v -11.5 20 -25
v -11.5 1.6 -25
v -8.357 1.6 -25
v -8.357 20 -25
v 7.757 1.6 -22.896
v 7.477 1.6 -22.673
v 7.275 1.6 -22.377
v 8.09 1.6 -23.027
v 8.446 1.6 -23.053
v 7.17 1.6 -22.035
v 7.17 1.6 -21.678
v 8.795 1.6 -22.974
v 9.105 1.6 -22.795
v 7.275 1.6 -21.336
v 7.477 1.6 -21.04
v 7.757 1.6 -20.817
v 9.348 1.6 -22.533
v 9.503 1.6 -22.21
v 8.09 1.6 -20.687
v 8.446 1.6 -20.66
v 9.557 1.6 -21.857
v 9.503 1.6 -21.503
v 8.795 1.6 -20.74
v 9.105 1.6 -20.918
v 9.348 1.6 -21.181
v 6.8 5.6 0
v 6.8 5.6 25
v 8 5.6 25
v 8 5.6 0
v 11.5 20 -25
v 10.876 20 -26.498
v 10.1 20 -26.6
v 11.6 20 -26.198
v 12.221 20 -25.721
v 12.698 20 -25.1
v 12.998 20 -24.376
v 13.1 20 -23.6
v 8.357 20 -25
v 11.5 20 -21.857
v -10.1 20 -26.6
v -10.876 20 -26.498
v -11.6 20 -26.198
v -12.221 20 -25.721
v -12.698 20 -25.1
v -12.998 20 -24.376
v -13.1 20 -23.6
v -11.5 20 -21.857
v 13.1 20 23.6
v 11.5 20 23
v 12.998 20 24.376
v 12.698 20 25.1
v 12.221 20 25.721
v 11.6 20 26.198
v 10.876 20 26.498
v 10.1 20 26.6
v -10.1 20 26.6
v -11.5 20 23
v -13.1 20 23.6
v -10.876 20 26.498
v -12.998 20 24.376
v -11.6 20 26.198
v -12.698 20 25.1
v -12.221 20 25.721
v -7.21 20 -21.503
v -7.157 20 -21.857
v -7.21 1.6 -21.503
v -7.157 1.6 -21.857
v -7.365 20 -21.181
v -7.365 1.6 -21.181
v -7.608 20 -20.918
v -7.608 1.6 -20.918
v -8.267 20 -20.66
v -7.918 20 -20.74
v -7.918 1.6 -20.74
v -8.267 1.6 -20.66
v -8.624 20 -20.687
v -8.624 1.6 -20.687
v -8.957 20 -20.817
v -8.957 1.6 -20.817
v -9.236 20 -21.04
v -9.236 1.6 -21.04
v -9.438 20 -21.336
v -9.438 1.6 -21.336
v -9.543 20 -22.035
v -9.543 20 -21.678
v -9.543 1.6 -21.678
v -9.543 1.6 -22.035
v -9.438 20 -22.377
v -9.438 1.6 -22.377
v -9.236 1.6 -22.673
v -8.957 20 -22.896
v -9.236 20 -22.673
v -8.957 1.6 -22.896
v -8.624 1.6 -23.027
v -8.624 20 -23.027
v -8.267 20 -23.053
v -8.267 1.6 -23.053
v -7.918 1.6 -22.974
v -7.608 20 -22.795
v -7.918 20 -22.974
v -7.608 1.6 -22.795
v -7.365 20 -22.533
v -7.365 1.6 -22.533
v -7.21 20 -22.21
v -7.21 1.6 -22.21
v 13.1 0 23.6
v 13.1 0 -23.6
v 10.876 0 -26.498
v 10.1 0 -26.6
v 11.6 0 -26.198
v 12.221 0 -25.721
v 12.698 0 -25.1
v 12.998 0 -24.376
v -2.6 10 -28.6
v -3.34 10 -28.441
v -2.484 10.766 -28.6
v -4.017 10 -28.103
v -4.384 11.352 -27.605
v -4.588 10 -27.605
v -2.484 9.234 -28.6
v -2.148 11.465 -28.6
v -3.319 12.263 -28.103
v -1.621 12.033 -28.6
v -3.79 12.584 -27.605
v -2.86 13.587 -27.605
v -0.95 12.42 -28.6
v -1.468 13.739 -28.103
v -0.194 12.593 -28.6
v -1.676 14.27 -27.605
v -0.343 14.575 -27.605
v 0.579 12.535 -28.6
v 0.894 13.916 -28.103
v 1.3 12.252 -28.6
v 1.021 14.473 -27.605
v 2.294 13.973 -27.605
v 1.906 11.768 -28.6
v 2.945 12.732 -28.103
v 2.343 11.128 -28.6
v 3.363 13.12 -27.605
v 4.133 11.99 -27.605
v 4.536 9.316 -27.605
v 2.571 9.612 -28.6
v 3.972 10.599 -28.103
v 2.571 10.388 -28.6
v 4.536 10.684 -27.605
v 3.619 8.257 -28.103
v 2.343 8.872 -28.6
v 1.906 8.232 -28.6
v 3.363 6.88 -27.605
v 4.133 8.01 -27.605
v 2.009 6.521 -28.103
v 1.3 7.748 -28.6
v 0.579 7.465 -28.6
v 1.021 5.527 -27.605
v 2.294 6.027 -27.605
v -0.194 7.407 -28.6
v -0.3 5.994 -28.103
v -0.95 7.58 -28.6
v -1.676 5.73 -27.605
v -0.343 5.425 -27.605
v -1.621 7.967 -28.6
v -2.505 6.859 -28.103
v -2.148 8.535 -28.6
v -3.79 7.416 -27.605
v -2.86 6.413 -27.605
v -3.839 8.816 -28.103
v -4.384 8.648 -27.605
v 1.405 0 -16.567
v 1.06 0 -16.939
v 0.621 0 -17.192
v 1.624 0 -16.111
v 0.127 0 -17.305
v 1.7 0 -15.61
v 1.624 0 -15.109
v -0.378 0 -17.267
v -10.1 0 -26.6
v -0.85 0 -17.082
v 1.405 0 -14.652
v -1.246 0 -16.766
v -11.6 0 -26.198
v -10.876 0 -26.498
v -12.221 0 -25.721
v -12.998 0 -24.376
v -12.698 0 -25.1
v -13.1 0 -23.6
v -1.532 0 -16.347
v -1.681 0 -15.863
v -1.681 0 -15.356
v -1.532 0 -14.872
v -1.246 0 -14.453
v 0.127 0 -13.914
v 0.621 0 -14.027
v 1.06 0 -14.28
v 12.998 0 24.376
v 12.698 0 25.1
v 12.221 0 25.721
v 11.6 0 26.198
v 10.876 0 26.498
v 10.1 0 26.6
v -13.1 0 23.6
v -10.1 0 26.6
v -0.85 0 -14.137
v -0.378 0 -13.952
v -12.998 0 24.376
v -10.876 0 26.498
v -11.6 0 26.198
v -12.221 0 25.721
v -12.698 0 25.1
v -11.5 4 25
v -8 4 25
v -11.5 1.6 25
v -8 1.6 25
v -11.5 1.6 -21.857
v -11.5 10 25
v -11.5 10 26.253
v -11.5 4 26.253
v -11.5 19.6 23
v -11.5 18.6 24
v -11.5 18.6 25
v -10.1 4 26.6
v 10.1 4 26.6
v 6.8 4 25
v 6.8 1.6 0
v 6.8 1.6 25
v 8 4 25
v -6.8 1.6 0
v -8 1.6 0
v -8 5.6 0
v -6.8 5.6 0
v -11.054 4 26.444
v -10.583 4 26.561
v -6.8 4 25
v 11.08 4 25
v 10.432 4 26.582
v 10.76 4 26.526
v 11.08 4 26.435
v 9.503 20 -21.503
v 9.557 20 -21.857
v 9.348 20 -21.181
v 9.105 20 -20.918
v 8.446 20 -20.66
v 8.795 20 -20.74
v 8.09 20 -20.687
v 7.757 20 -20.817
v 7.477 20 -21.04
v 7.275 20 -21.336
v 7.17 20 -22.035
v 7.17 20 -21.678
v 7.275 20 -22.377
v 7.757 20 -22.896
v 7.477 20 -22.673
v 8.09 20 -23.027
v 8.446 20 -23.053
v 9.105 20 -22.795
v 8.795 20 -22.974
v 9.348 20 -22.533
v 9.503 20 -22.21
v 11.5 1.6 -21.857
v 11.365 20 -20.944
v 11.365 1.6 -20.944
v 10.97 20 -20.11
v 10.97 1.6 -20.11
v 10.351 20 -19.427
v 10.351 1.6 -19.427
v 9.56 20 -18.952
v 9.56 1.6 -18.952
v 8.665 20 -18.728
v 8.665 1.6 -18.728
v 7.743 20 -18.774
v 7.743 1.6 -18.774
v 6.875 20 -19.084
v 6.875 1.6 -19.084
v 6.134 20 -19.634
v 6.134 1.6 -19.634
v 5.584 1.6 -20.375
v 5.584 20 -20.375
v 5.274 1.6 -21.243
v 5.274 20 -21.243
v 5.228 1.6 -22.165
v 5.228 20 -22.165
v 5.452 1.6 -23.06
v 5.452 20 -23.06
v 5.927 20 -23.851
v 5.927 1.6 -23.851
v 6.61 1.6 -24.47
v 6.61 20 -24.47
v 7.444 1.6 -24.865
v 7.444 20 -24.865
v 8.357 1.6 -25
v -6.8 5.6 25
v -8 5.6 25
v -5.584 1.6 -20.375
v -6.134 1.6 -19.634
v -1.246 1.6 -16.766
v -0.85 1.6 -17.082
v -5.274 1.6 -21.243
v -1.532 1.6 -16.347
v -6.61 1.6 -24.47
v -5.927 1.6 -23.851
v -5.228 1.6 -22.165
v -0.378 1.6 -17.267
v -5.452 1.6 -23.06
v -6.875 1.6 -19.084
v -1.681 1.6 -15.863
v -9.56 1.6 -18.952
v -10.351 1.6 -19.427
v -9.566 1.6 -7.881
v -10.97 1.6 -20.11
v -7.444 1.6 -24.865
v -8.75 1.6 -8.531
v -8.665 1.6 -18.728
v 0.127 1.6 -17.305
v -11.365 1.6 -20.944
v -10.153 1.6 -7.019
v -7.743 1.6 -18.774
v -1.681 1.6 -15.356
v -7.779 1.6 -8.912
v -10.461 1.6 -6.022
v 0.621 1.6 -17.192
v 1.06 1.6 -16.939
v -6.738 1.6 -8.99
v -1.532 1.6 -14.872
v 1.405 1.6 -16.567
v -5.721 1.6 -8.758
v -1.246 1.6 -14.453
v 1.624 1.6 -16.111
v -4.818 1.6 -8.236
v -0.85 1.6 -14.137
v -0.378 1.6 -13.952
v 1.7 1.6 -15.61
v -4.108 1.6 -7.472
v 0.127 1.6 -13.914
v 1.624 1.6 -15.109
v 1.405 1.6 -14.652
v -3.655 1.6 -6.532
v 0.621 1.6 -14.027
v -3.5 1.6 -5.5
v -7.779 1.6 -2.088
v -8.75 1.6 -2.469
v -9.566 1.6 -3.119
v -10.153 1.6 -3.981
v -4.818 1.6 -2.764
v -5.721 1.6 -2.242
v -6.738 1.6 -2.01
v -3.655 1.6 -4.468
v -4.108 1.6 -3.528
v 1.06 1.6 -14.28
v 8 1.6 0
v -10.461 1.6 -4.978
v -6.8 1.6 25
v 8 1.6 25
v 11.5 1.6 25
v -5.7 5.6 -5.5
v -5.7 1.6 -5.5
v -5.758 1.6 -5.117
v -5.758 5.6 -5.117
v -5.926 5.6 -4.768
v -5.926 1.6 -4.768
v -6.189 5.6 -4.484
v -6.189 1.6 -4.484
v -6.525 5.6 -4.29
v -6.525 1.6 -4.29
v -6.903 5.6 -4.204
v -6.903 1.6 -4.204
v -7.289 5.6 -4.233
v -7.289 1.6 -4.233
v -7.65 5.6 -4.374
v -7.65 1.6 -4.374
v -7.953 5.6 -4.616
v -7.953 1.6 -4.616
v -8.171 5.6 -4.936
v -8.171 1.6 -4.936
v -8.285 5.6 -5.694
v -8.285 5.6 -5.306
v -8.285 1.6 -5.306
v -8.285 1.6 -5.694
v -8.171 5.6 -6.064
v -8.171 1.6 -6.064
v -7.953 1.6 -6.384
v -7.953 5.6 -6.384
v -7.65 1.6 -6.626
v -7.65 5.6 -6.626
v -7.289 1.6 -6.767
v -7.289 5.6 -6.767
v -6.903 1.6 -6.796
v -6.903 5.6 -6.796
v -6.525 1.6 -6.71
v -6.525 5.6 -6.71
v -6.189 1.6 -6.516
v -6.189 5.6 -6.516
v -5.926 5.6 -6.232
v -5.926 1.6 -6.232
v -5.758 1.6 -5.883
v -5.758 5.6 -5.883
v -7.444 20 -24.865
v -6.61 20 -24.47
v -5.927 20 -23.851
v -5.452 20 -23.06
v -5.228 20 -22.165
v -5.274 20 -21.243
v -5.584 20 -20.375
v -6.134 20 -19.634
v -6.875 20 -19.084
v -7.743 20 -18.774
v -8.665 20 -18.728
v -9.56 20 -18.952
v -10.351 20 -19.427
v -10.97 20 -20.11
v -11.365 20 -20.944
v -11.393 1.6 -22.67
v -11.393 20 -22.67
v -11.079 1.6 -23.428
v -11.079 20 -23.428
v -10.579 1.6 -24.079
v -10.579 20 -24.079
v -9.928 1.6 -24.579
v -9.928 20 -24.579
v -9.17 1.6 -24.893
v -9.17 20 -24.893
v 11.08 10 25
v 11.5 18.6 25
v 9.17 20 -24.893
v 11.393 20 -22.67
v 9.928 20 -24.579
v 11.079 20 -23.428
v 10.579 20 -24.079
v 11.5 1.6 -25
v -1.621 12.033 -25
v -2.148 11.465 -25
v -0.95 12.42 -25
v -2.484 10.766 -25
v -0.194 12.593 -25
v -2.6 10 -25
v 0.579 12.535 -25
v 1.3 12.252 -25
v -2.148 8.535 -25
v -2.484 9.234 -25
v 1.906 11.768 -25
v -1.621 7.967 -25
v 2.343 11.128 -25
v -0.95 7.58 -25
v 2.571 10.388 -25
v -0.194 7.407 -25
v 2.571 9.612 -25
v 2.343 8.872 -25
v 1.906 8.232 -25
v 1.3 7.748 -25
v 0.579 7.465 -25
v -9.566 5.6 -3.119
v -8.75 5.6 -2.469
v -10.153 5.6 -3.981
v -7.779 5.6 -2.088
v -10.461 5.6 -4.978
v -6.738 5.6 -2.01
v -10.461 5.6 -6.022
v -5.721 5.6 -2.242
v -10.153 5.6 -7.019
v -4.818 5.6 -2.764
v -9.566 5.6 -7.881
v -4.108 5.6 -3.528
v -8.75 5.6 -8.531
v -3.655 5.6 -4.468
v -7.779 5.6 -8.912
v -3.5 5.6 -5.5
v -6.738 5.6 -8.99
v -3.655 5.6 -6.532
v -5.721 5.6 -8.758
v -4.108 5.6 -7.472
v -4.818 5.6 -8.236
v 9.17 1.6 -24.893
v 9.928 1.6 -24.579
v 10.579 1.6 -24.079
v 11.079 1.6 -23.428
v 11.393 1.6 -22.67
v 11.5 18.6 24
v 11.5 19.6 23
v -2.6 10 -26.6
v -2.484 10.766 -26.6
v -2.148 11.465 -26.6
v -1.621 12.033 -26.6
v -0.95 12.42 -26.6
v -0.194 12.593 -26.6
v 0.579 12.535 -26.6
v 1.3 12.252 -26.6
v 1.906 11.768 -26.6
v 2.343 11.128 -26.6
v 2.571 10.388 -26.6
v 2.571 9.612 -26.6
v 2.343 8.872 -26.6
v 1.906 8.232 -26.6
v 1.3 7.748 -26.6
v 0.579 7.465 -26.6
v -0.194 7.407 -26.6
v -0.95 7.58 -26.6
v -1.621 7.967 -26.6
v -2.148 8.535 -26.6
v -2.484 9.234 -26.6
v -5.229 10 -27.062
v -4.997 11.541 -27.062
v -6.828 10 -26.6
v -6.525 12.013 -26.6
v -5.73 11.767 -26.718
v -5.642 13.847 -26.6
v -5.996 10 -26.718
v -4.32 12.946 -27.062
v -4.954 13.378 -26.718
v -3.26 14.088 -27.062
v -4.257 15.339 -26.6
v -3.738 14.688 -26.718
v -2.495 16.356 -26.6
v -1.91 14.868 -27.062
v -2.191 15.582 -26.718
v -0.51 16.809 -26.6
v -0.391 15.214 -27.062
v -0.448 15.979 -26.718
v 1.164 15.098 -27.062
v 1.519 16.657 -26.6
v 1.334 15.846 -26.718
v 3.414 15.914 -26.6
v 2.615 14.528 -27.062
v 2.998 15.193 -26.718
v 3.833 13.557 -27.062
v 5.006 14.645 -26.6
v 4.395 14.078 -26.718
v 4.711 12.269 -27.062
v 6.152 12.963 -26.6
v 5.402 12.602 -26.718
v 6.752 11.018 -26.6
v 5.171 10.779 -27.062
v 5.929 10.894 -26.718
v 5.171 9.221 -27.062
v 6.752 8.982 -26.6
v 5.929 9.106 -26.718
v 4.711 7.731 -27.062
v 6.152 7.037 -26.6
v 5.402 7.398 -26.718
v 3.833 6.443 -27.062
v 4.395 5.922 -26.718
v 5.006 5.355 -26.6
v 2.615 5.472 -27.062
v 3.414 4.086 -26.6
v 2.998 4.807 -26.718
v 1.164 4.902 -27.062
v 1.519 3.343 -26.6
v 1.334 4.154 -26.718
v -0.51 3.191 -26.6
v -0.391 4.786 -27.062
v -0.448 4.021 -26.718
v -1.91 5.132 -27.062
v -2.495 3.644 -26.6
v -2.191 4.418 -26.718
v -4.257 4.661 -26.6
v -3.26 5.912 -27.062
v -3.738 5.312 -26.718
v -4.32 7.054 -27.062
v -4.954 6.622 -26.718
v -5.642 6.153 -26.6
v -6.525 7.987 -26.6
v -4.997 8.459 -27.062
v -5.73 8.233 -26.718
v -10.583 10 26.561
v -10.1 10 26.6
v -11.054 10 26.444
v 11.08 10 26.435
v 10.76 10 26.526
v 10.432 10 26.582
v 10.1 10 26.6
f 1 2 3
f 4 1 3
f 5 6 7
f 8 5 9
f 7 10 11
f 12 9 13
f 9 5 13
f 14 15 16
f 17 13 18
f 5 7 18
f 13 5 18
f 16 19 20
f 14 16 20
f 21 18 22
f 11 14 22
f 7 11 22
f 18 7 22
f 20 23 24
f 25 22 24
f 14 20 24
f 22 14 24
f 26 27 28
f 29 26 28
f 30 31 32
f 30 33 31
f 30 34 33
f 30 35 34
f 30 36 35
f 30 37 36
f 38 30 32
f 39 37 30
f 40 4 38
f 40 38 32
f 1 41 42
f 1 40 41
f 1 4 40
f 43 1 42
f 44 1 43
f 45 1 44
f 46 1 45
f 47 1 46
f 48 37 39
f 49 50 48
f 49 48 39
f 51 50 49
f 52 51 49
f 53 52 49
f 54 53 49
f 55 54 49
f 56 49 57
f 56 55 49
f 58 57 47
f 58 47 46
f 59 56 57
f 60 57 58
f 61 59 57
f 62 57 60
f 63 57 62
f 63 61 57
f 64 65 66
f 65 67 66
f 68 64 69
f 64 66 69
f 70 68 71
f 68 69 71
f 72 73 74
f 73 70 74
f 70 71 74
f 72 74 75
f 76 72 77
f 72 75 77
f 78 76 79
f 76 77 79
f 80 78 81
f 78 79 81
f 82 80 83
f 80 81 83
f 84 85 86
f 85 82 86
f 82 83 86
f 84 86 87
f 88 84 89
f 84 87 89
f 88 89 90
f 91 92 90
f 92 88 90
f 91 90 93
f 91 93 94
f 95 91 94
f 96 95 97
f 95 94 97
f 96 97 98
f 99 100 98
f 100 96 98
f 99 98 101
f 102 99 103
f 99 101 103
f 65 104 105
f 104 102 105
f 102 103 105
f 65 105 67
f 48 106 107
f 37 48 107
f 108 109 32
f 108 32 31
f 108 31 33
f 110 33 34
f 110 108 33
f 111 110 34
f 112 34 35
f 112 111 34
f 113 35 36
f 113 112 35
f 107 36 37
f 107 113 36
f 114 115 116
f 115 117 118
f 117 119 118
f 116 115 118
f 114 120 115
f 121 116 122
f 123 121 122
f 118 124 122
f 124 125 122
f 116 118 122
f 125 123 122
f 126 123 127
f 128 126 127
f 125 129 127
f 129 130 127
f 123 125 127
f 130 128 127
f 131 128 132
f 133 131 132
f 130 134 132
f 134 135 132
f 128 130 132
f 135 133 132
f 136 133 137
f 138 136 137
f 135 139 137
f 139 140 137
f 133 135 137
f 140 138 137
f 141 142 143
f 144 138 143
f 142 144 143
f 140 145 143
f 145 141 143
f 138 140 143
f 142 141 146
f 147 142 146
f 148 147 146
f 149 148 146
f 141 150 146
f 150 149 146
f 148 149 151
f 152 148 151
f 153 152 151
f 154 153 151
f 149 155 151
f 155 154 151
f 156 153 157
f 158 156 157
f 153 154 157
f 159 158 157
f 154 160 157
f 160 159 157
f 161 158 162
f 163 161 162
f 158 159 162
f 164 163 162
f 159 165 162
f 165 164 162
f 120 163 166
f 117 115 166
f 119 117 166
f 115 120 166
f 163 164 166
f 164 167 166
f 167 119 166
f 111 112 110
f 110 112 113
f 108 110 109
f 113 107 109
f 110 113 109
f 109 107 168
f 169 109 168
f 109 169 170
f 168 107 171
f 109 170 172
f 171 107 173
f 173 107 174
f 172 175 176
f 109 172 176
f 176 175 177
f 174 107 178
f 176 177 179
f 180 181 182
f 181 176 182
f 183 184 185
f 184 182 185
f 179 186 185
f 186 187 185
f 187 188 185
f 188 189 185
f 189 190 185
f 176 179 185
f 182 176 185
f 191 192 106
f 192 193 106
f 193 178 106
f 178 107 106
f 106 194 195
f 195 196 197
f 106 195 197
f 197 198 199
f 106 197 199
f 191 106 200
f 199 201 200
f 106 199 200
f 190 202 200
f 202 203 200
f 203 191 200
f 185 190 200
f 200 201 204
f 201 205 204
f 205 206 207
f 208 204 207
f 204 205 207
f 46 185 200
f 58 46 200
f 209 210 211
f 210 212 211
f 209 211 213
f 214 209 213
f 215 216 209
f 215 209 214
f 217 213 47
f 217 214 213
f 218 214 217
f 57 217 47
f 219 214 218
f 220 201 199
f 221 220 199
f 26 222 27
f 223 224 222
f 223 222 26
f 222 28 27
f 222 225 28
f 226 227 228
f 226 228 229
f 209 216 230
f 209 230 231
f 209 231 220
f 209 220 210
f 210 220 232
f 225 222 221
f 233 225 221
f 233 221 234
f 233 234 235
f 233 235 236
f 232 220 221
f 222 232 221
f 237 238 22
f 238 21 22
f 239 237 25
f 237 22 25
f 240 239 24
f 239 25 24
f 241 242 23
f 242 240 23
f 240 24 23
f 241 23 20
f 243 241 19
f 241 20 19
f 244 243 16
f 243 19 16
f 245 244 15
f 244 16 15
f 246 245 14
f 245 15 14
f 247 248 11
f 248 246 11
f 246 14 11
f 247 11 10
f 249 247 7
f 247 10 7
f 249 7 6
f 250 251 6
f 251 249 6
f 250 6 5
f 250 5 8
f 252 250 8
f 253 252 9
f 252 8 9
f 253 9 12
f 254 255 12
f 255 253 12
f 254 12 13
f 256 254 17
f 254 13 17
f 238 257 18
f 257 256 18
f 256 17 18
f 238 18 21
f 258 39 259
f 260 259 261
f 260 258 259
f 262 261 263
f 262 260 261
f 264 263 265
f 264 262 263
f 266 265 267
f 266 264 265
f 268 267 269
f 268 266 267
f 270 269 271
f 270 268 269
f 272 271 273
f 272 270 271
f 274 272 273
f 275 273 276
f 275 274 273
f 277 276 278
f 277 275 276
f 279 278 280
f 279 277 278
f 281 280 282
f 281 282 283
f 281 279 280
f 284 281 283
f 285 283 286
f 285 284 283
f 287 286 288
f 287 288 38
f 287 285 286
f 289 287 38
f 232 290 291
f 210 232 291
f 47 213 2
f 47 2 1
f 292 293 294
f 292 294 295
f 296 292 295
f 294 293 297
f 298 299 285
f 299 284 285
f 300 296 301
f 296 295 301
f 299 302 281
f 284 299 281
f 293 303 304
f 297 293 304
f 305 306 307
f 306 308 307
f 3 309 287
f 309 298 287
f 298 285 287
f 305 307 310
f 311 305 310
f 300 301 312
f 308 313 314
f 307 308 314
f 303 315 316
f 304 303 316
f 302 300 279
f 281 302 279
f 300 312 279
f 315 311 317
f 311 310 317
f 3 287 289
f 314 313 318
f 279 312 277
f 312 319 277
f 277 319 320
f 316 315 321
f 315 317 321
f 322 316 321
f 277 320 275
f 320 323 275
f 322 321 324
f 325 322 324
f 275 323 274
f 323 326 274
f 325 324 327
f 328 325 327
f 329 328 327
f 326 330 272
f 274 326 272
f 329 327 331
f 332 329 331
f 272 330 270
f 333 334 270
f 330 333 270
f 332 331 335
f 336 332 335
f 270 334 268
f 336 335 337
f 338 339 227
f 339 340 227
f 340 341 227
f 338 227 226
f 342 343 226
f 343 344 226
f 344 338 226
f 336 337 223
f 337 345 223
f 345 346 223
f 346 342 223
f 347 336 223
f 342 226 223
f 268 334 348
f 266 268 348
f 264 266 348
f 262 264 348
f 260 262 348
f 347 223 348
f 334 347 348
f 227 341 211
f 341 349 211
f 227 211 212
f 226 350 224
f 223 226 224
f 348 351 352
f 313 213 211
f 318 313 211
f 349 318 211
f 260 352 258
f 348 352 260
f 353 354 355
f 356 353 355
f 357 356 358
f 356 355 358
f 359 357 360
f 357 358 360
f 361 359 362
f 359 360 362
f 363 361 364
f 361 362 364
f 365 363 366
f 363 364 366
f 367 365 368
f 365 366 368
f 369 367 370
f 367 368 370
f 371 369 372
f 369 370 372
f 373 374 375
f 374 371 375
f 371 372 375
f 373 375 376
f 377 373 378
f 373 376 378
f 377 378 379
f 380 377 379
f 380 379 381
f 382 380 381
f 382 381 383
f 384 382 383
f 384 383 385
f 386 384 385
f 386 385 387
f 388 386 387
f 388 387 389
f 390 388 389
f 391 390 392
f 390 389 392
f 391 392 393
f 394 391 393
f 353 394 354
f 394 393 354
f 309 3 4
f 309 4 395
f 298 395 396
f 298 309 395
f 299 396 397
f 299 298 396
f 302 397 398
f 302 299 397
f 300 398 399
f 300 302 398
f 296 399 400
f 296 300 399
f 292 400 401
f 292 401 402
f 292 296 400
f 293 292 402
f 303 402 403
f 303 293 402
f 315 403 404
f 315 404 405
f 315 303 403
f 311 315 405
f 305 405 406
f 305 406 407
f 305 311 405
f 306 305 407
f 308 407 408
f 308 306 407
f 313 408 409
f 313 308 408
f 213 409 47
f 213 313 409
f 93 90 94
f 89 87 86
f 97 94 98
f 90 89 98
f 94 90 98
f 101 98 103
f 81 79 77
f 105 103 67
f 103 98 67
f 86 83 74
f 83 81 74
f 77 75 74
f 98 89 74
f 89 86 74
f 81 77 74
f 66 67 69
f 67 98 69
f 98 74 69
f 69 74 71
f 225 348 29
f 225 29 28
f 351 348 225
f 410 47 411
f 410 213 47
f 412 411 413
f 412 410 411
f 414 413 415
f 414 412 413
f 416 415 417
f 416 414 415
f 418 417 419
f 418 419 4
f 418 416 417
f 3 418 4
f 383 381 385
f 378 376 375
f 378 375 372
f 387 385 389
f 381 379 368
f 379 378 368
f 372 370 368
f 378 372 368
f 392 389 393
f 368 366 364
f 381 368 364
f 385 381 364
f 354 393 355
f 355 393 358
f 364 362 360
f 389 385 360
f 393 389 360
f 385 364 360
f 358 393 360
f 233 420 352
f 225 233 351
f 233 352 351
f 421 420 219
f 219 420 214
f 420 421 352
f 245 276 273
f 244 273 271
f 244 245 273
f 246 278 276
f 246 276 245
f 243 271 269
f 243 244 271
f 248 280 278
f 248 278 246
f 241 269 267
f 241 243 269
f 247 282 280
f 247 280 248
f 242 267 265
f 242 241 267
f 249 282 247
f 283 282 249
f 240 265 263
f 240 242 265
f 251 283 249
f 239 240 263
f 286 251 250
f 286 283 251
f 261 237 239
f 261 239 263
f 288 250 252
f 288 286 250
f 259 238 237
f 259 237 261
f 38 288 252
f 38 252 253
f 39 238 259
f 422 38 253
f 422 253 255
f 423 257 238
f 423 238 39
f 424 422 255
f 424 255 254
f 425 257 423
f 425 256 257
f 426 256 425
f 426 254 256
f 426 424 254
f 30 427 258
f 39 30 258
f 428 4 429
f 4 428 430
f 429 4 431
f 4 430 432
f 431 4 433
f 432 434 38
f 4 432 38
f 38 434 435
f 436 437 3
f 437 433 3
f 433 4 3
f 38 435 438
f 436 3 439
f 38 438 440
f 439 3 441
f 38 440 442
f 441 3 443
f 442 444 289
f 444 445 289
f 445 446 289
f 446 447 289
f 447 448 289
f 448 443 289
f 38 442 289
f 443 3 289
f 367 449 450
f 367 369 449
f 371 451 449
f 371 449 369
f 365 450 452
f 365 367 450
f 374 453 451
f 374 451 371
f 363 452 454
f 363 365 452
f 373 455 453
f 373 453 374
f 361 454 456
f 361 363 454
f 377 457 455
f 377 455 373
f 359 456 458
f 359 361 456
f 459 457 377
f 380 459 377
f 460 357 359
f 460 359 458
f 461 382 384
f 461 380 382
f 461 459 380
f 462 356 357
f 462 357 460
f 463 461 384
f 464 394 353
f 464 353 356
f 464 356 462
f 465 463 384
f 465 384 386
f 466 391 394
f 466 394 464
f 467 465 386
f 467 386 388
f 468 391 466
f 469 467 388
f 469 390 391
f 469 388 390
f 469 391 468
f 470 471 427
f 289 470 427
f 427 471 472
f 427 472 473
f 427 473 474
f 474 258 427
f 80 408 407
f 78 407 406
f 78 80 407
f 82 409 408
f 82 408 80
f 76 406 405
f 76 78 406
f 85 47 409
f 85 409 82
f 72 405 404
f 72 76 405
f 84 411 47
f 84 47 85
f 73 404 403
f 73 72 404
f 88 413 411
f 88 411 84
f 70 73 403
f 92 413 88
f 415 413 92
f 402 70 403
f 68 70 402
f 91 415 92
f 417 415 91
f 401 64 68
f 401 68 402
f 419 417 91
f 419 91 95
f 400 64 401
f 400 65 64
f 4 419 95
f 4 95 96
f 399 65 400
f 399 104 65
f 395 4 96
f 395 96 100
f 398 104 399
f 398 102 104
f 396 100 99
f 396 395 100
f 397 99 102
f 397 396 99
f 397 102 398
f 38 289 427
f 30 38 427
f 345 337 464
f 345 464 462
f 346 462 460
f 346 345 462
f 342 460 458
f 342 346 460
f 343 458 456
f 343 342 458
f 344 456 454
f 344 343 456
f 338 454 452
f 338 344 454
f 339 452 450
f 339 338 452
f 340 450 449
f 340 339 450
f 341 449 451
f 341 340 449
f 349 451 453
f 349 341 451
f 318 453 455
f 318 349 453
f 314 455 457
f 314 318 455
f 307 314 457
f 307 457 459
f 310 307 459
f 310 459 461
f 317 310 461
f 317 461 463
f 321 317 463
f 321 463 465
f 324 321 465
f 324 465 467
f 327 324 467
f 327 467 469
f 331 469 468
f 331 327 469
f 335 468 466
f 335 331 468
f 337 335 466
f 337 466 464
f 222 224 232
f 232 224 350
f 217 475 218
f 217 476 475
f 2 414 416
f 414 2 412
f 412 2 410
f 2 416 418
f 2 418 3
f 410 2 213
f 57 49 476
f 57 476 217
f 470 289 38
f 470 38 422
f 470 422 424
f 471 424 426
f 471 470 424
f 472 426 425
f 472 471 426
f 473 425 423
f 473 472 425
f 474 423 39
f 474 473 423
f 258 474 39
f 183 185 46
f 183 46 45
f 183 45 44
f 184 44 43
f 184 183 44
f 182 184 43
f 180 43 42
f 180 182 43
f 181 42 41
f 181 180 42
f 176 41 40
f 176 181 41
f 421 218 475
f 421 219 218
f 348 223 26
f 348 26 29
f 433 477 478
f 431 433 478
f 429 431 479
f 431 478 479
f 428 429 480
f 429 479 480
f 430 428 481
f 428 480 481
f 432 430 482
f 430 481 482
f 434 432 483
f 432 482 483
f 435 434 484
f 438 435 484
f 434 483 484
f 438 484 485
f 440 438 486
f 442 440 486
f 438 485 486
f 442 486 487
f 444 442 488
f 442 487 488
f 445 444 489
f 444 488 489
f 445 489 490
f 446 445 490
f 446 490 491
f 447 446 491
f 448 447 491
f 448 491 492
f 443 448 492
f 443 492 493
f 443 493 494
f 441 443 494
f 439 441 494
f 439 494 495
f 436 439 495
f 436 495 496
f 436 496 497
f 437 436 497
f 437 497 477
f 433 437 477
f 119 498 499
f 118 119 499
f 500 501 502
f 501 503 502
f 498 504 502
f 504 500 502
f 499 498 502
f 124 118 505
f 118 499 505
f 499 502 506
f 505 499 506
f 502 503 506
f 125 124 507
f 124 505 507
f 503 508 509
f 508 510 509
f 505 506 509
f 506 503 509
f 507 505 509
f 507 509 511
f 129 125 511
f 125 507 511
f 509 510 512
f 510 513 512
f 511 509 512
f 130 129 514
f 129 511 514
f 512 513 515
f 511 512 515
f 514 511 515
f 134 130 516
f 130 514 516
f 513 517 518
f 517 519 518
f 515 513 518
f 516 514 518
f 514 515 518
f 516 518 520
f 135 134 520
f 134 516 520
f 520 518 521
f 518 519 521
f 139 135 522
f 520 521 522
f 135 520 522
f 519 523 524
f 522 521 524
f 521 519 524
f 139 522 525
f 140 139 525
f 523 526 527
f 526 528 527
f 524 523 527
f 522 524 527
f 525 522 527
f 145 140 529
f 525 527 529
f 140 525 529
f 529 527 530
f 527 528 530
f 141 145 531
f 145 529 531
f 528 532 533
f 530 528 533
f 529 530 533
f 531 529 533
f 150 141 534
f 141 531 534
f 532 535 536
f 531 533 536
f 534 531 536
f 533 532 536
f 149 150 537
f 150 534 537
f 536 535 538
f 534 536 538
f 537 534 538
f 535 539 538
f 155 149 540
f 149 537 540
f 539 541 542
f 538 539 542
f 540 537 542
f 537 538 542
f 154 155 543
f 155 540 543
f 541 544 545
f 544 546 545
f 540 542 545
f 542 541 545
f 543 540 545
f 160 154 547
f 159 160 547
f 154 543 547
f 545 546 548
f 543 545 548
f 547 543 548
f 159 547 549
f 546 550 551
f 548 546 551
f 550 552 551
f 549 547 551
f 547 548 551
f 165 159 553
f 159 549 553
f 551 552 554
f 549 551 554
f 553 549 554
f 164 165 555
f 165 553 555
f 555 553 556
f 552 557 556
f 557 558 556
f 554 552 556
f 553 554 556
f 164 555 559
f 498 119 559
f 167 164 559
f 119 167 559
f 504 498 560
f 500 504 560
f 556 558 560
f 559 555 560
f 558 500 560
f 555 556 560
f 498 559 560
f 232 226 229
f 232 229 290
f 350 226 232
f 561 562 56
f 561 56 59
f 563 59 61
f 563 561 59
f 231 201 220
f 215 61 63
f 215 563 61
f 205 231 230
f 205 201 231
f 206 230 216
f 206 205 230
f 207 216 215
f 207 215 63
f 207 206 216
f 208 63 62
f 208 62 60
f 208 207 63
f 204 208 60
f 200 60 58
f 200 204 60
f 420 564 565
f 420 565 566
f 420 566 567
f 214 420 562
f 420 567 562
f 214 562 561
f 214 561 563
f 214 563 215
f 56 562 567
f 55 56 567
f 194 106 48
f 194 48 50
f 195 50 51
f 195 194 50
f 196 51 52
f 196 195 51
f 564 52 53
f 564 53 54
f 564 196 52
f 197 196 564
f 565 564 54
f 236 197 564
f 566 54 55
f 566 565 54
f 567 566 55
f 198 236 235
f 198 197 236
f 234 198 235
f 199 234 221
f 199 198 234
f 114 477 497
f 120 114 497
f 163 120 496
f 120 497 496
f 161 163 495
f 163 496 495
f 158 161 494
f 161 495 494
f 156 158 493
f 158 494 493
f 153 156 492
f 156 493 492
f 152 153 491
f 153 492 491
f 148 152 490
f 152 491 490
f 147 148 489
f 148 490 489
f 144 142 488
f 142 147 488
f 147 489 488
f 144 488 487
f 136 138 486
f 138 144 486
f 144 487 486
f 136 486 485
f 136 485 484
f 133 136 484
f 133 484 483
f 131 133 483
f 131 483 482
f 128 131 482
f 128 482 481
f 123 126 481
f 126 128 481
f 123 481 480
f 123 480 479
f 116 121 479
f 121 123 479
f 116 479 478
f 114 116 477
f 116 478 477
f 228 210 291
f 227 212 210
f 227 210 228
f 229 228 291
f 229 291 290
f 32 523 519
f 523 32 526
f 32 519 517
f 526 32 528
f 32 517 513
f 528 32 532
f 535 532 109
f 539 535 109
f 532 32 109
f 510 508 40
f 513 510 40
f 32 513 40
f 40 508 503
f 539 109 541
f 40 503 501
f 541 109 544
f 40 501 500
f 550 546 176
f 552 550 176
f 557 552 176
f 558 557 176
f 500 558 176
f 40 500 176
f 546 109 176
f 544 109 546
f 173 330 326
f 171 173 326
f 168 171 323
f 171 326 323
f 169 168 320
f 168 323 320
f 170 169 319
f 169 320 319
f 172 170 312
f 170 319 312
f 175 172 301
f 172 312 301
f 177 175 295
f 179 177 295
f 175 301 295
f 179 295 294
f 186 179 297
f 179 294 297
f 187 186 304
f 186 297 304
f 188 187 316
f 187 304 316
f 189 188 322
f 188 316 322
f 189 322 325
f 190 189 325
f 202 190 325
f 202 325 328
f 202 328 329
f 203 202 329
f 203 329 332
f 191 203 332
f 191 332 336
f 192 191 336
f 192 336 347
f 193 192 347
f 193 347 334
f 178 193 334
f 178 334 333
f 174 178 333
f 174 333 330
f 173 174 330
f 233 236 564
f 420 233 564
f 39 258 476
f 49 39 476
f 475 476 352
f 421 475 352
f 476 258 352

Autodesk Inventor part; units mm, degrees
ref_plane "YZ Plane" through (0, 0, 0) normal (1, 0, 0) x (0, 1, 0)
ref_plane "XZ Plane" through (0, 0, 0) normal (0, 1, 0) x (-1, 0, 0)
ref_plane "XY Plane" through (0, 0, 0) normal (0, 0, 1) x (1, 0, 0)
sketch "Sketch1" plane through (0, 0, 0) normal (0, 1, 0) x (-1, 0, 0)
  line L0 (-11.5, 25) -> (11.5, 25)
  line L1 (11.5, 25) -> (11.5, -25)
  line L2 (11.5, -25) -> (-11.5, -25)
  line L3 (-11.5, -25) -> (-11.5, 25)
  line L4 (-11.5, 25) -> (11.5, -25) construction
  line L5 (11.5, 25) -> (-11.5, -25) construction
  line L6 (-13.1, -26.6) -> (13.1, -26.6)
  line L7 (13.1, -26.6) -> (13.1, 26.6)
  line L8 (13.1, 26.6) -> (-13.1, 26.6)
  line L9 (-13.1, 26.6) -> (-13.1, -26.6)
  line L10 (-13.1, -26.6) -> (13.1, 26.6) construction
  line L11 (13.1, -26.6) -> (-13.1, 26.6) construction
  point P0 (0, 0)
  dimension "d0" = 23
  dimension "d1" = 50
  dimension "d2" = 1.6
  dimension "d3" = 1.6
extrude "Extrusion1" add sketch "Sketch1" along normal blind 20
sketch "Sketch2" plane through (0, 0, 0) normal (0, -1, 0) x (1, 0, 0)
  line L0 (-11.5, -25) -> (-11.5, 25) projected
  line L1 (-11.5, 25) -> (11.5, 25) projected
  line L2 (11.5, 25) -> (11.5, -25) projected
  line L3 (11.5, -25) -> (-11.5, -25) projected
  point P0 (0, 0)
extrude "Extrusion2" add sketch "Sketch2" against normal blind 1.6
sketch "Sketch3" plane through (0, 1.6, 0) normal (0, 1, 0) x (1, 0, 0)
  line L0 (-11.5, 25) -> (11.5, 25) projected
  line L1 (-10.5, 9) -> (10.5, 9)
  line L2 (10.5, 9) -> (10.5, -23)
  line L3 (10.5, -23) -> (-10.5, -23)
  line L4 (-10.5, -23) -> (-10.5, 9)
  line L5 (-10.5, 9) -> (10.5, -23) construction
  line L6 (10.5, 9) -> (-10.5, -23) construction
  circle A0 centre (-7, 5.5) radius 1.3
  circle A1 centre (-7, 5.5) radius 3.5
  point P0 (0, 0)
  point P1 (0, -7)
  dimension "d8" = 21
  dimension "d9" = 32
  dimension "d10" = 16
  dimension "d11" = 2.6
  dimension "d26" = 3.5
  dimension "d27" = 3.5
  dimension "d29" = 7
extrude "Extrusion3" add sketch "Sketch3" along normal blind 4 contours A1
sketch "Sketch4" plane through (-13.1, 0, 26.6) normal (0, 0, 1) x (1, 0, 0)
  line L0 (0, 0) -> (26.2, 0) projected
  line L1 (1.6, 1.6) -> (1.6, 20) projected
  line L2 (1.6, 1.6) -> (1.6, 20) projected
  line L3 (24.6, 1.6) -> (24.6, 20) projected
  line L4 (24.6, 1.6) -> (24.6, 20) projected
  line L5 (1.6, 4) -> (24.1799, 4)
  line L6 (24.1799, 4) -> (24.1799, 10)
  line L7 (24.1799, 10) -> (1.6, 10)
  line L8 (1.6, 10) -> (1.6, 4)
  point P0 (13.1, 0)
  dimension "d16" = 6
  dimension "d17" = 4
extrude "Extrusion4" cut sketch "Sketch4" against normal blind 4
sketch "Sketch5" plane through (0, 1.6, 0) normal (0, 1, 0) x (1, 0, 0)
  line L0 (-11.5, -25) -> (-11.5, 25) projected
  line L1 (11.5, -25) -> (-11.5, -25) projected
  line L2 (11.5, 25) -> (11.5, -25) projected
  line L3 (6.8, 0) -> (8, 0)
  line L4 (8, 0) -> (8, -25)
  line L5 (8, -25) -> (6.8, -25)
  line L6 (6.8, -25) -> (6.8, 0)
  line L7 (-8, 0) -> (-6.8, 0)
  line L8 (-6.8, 0) -> (-6.8, -25)
  line L9 (-6.8, -25) -> (-8, -25)
  line L10 (-8, -25) -> (-8, 0)
  point P0 (0, 0)
  dimension "d20" = 1.2
  dimension "d21" = 1.2
  dimension "d22" = 3.5
  dimension "d23" = 3.5
extrude "Extrusion5" add sketch "Sketch5" along normal blind 4
fillet "Fillet1" radius 3 4 edges at (13.1, 10, 26.6) (13.1, 10, -26.6) (-13.1, 10, -26.6) (-13.1, 10, 26.6)
sketch "Sketch6" plane through (10.1, 0, -26.6) normal (0, 0, -1) x (-1, 0, 0)
  circle A0 centre (10.1, 10) radius 2.6
  point P0 (10.1, 0)
  dimension "d31" = 5.2
extrude "Extrusion6" cut sketch "Sketch6" against normal blind 4
sketch "Sketch7" plane through (10.1, 0, -26.6) normal (0, 0, -1) x (-1, 0, 0)
  circle A0 centre (10.1, 10) radius 2.6 projected
  circle A1 centre (10.1, 10) radius 4
  point P0 (10.1, 0)
  dimension "d34" = 8
extrude "Extrusion7" add sketch "Sketch7" along normal blind 2
fillet "Fillet2" radius 3 2 edges at (4, 10, -26.6) (4, 10, -28.6)
sketch "Sketch8" plane through (-11.5, 20, 25) normal (1, 0, 0) x (0, 0, -1)
  line L0 (-1.2533, -16) -> (-1.2533, -10) projected
  line L1 (-1.2533, -16) -> (0, -16) projected
  line L2 (0, -18.4) -> (0, -16) projected
  line L3 (0, -18.4) -> (50, -18.4) projected
  line L4 (50, -18.4) -> (50, 0) projected
  line L5 (0, 0) -> (50, 0) projected
  line L6 (0, -10) -> (0, 0) projected
  line L7 (-1.2533, -10) -> (0, -10) projected
  line L8 (27, -18.4) -> (34, -18.4) projected
  line L9 (29.2, -14.4) -> (31.8, -14.4) projected
  line L10 (34, -14.4) -> (27, -14.4) projected
  point P0 (25, -20)
  dimension "d38" = 14.4
sketch "Sketch9" plane through (11.5, 20, 25) normal (0, 0, -1) x (-1, 0, 0)
  line L0 (23, -10) -> (23, 0) projected
  line L1 (0, 0) -> (23, 0)
  line L2 (23, 0) -> (23, -1.4)
  line L3 (23, -1.4) -> (0, -1.4)
  line L4 (0, -1.4) -> (0, 0)
  point P0 (11.5, -20)
  dimension "d39" = 1.4
extrude "Extrusion8" add sketch "Sketch9" along normal blind 2
sketch "Sketch10" plane through (0, 1.6, 0) normal (0, 1, 0) x (1, 0, 0)
  line L0 (11.5, 25) -> (11.5, -25) projected
  line L1 (-11.5, 25) -> (11.5, 25) projected
  line L2 (-11.5, -25) -> (-11.5, 25) projected
  circle A0 centre (-8.3566, 21.8566) radius 1.2
  circle A1 centre (-8.3566, 21.8566) radius 3.1434
  circle A2 centre (8.3566, 21.8566) radius 1.2
  circle A3 centre (8.3566, 21.8566) radius 3.1434
  point P0 (0, 0)
  dimension "d45" = 2.4
  dimension "d46" = 3.1434
  dimension "d47" = 3.1434
  dimension "d48" = 2.4
  dimension "d49" = 3.1434
  dimension "d50" = 3.1434
extrude "Extrusion9" add sketch "Sketch10" along normal up to surface (18.4 mm away) contours A3 | A1
chamfer "Chamfer2" distance 1 angle 45 1 edges at (0, 18.6, 23)
sketch "Sketch11" plane through (0, 1.6, 0) normal (0, 1, 0) x (1, 0, 0)
  circle A0 centre (0, 15.6096) radius 1.7
  point P0 (0, 0)
  dimension "d56" = 3.4
extrude "Extrusion10" cut sketch "Sketch11" against normal through all
equation "\"d3\" = d2"
equation "\"d47\" = d46"
equation "\"d49\" = d47"
equation "\"d50\" = d46"
properties part number "bottom v3"
